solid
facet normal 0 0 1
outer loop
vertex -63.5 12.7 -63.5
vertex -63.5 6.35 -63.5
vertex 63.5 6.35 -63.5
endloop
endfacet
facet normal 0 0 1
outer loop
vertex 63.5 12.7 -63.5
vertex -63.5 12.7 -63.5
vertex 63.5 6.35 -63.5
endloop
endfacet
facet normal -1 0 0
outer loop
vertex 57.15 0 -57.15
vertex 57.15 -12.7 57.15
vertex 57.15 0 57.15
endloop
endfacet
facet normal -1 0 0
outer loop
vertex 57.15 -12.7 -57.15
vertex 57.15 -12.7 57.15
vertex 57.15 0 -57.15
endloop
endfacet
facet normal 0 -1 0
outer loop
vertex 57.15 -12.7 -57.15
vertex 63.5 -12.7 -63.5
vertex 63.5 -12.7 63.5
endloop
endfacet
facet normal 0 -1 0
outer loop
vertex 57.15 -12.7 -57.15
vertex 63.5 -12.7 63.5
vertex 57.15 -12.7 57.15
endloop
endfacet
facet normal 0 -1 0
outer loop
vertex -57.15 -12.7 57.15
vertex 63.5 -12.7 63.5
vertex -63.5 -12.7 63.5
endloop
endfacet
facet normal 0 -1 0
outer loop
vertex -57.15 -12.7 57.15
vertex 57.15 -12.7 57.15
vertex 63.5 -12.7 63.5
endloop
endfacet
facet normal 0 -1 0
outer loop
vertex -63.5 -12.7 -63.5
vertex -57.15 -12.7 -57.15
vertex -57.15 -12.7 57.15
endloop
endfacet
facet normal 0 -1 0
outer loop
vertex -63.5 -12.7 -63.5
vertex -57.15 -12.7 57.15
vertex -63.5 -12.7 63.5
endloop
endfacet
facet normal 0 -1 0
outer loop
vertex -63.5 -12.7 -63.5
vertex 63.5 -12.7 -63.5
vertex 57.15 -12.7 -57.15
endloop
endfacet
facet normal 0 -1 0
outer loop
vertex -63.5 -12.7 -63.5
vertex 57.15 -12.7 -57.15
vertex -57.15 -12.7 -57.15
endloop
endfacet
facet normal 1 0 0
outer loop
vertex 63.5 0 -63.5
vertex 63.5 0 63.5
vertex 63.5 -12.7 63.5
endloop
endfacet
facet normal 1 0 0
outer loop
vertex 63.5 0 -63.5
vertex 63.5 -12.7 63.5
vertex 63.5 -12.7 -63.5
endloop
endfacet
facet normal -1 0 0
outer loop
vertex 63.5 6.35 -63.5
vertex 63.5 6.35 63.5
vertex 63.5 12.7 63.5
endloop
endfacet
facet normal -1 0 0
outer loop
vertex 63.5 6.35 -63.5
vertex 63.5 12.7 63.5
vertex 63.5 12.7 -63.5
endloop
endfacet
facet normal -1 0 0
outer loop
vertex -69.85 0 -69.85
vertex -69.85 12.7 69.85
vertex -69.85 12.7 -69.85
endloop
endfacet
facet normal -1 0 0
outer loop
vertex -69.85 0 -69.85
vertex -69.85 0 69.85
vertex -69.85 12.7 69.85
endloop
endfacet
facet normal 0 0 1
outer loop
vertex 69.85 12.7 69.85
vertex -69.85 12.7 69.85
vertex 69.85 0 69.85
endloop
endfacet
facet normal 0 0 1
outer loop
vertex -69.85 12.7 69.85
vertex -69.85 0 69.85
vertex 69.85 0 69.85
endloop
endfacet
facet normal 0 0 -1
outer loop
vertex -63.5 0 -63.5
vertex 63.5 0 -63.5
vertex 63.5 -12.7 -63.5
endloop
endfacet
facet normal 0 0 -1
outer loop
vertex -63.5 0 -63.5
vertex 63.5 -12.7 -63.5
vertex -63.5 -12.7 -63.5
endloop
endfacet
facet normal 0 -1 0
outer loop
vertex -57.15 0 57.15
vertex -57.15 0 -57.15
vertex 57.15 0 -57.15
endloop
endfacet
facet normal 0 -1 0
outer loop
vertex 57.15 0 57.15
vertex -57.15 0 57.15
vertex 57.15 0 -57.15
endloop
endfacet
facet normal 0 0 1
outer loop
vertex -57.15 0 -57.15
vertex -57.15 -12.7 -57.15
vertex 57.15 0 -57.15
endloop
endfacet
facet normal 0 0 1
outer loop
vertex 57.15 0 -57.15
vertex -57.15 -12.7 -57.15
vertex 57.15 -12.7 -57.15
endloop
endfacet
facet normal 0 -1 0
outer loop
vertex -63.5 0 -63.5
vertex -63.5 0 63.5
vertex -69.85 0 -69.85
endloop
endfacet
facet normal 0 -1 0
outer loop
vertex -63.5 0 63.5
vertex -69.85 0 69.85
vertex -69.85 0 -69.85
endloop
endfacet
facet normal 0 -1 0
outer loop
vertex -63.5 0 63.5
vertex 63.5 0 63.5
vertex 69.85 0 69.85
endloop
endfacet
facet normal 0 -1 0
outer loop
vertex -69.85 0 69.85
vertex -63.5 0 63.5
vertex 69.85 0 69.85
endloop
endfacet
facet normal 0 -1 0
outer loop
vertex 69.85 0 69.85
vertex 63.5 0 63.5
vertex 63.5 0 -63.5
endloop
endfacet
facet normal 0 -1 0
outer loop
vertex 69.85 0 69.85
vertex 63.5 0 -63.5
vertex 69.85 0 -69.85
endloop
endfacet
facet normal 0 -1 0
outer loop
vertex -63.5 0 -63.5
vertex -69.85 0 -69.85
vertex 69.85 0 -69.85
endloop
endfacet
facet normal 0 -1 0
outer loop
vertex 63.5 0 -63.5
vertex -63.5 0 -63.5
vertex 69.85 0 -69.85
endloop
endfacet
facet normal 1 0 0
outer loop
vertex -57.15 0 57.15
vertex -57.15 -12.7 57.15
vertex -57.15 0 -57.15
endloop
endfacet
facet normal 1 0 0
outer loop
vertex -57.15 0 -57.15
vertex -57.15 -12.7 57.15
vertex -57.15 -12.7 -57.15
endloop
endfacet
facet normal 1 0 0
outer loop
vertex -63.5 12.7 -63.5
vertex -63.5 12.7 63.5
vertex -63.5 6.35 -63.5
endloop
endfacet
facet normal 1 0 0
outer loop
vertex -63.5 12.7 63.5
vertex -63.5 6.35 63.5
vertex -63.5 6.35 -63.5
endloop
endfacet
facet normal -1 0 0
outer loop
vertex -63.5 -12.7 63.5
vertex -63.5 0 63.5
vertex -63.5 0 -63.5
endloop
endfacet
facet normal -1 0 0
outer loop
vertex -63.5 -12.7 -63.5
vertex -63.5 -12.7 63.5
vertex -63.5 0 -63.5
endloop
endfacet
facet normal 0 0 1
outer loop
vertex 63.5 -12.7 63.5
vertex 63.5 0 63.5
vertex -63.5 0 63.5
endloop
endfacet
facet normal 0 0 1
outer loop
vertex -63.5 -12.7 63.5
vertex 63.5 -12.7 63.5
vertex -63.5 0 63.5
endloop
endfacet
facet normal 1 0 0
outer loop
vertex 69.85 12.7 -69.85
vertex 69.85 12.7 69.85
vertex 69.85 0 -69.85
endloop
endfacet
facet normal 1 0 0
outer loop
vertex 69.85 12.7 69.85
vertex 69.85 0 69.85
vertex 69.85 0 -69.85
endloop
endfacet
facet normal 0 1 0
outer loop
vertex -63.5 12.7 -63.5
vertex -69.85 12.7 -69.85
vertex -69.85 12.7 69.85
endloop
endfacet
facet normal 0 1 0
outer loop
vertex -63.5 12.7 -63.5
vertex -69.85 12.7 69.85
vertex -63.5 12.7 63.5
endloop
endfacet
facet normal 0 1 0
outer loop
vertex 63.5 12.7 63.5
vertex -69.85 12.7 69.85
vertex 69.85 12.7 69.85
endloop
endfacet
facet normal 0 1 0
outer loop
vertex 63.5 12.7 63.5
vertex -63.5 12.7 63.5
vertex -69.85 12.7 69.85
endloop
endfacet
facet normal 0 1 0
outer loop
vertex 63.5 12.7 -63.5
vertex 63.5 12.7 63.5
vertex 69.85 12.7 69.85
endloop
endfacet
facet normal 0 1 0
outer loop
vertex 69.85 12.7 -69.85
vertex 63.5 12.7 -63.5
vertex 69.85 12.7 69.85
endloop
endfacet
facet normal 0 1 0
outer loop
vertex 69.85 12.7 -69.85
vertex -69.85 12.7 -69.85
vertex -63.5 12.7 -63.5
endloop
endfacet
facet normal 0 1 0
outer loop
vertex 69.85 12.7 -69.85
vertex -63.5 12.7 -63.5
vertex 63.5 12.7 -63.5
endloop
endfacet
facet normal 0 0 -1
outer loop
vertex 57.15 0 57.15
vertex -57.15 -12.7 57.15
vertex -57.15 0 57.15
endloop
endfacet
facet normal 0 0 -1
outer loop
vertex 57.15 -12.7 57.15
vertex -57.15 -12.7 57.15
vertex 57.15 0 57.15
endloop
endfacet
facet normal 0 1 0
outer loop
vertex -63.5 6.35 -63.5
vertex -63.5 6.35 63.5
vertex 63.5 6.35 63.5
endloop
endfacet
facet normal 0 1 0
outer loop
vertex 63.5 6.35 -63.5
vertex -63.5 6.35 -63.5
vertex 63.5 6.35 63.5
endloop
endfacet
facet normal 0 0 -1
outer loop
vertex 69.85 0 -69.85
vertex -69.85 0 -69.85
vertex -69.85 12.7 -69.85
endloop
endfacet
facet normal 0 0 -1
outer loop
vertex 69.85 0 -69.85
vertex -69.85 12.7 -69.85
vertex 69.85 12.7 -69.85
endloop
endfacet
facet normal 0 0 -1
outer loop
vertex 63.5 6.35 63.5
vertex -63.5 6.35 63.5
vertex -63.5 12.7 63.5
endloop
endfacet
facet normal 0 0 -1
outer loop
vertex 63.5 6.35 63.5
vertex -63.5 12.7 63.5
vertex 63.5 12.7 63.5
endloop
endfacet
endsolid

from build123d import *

# Parameters (mm, degrees)
SKETCH1_W           = 139.7
SKETCH1_H           = 139.7
BOSS_EXTRUDE1_DEPTH = 6.35
SKETCH4_W           = 139.7
SKETCH4_H           = 139.7
BOSS_EXTRUDE2_DEPTH = 6.35
SHELL1_T            = -6.35
SKETCH5_W           = 127
SKETCH5_H           = 127
BOSS_EXTRUDE4_DEPTH = 12.7
SHELL2_START        = -12.7
SHELL2_OUTLINE_W    = 114.3
SHELL2_OUTLINE_H    = 114.3
SHELL2_DEPTH        = 12.7


# Read off the part's stored shape, not the designer's step: Shell2
with BuildPart() as part:
    # Sketch1 → Boss-Extrude1 (new body)
    with BuildSketch(Plane(origin=(0, 0, 0), x_dir=(1, 0, 0), z_dir=(0, 1, 0))):
        Rectangle(SKETCH1_W, SKETCH1_H)
    extrude(amount=BOSS_EXTRUDE1_DEPTH)

    # Sketch4 → Boss-Extrude2 (add)
    with BuildSketch(Plane(origin=(0, 6.35, 0), x_dir=(1, 0, 0), z_dir=(0, 1, 0))):
        Rectangle(SKETCH4_W, SKETCH4_H)
    extrude(amount=BOSS_EXTRUDE2_DEPTH)

    # Shell1
    shell1_openings = [part.faces().sort_by_distance(p)[0] for p in [
        (0, 12.7, 0),
    ]]
    offset(amount=SHELL1_T, openings=shell1_openings, kind=Kind.INTERSECTION)

    # Sketch5 → Boss-Extrude4 (add)
    with BuildSketch(Plane(origin=(0, 0, 0), x_dir=(-1, 0, 0), z_dir=(0, -1, 0))):
        Rectangle(SKETCH5_W, SKETCH5_H)
    extrude(amount=BOSS_EXTRUDE4_DEPTH)

    # Shell2 outline → Shell2 (cut)
    with BuildSketch(Plane(origin=(0, 0, 0), x_dir=(1, 0, 0), z_dir=(0, 1, 0)).offset(SHELL2_START)):
        Rectangle(SHELL2_OUTLINE_W, SHELL2_OUTLINE_H)
    extrude(amount=SHELL2_DEPTH, mode=Mode.SUBTRACT)


solid = part.part
